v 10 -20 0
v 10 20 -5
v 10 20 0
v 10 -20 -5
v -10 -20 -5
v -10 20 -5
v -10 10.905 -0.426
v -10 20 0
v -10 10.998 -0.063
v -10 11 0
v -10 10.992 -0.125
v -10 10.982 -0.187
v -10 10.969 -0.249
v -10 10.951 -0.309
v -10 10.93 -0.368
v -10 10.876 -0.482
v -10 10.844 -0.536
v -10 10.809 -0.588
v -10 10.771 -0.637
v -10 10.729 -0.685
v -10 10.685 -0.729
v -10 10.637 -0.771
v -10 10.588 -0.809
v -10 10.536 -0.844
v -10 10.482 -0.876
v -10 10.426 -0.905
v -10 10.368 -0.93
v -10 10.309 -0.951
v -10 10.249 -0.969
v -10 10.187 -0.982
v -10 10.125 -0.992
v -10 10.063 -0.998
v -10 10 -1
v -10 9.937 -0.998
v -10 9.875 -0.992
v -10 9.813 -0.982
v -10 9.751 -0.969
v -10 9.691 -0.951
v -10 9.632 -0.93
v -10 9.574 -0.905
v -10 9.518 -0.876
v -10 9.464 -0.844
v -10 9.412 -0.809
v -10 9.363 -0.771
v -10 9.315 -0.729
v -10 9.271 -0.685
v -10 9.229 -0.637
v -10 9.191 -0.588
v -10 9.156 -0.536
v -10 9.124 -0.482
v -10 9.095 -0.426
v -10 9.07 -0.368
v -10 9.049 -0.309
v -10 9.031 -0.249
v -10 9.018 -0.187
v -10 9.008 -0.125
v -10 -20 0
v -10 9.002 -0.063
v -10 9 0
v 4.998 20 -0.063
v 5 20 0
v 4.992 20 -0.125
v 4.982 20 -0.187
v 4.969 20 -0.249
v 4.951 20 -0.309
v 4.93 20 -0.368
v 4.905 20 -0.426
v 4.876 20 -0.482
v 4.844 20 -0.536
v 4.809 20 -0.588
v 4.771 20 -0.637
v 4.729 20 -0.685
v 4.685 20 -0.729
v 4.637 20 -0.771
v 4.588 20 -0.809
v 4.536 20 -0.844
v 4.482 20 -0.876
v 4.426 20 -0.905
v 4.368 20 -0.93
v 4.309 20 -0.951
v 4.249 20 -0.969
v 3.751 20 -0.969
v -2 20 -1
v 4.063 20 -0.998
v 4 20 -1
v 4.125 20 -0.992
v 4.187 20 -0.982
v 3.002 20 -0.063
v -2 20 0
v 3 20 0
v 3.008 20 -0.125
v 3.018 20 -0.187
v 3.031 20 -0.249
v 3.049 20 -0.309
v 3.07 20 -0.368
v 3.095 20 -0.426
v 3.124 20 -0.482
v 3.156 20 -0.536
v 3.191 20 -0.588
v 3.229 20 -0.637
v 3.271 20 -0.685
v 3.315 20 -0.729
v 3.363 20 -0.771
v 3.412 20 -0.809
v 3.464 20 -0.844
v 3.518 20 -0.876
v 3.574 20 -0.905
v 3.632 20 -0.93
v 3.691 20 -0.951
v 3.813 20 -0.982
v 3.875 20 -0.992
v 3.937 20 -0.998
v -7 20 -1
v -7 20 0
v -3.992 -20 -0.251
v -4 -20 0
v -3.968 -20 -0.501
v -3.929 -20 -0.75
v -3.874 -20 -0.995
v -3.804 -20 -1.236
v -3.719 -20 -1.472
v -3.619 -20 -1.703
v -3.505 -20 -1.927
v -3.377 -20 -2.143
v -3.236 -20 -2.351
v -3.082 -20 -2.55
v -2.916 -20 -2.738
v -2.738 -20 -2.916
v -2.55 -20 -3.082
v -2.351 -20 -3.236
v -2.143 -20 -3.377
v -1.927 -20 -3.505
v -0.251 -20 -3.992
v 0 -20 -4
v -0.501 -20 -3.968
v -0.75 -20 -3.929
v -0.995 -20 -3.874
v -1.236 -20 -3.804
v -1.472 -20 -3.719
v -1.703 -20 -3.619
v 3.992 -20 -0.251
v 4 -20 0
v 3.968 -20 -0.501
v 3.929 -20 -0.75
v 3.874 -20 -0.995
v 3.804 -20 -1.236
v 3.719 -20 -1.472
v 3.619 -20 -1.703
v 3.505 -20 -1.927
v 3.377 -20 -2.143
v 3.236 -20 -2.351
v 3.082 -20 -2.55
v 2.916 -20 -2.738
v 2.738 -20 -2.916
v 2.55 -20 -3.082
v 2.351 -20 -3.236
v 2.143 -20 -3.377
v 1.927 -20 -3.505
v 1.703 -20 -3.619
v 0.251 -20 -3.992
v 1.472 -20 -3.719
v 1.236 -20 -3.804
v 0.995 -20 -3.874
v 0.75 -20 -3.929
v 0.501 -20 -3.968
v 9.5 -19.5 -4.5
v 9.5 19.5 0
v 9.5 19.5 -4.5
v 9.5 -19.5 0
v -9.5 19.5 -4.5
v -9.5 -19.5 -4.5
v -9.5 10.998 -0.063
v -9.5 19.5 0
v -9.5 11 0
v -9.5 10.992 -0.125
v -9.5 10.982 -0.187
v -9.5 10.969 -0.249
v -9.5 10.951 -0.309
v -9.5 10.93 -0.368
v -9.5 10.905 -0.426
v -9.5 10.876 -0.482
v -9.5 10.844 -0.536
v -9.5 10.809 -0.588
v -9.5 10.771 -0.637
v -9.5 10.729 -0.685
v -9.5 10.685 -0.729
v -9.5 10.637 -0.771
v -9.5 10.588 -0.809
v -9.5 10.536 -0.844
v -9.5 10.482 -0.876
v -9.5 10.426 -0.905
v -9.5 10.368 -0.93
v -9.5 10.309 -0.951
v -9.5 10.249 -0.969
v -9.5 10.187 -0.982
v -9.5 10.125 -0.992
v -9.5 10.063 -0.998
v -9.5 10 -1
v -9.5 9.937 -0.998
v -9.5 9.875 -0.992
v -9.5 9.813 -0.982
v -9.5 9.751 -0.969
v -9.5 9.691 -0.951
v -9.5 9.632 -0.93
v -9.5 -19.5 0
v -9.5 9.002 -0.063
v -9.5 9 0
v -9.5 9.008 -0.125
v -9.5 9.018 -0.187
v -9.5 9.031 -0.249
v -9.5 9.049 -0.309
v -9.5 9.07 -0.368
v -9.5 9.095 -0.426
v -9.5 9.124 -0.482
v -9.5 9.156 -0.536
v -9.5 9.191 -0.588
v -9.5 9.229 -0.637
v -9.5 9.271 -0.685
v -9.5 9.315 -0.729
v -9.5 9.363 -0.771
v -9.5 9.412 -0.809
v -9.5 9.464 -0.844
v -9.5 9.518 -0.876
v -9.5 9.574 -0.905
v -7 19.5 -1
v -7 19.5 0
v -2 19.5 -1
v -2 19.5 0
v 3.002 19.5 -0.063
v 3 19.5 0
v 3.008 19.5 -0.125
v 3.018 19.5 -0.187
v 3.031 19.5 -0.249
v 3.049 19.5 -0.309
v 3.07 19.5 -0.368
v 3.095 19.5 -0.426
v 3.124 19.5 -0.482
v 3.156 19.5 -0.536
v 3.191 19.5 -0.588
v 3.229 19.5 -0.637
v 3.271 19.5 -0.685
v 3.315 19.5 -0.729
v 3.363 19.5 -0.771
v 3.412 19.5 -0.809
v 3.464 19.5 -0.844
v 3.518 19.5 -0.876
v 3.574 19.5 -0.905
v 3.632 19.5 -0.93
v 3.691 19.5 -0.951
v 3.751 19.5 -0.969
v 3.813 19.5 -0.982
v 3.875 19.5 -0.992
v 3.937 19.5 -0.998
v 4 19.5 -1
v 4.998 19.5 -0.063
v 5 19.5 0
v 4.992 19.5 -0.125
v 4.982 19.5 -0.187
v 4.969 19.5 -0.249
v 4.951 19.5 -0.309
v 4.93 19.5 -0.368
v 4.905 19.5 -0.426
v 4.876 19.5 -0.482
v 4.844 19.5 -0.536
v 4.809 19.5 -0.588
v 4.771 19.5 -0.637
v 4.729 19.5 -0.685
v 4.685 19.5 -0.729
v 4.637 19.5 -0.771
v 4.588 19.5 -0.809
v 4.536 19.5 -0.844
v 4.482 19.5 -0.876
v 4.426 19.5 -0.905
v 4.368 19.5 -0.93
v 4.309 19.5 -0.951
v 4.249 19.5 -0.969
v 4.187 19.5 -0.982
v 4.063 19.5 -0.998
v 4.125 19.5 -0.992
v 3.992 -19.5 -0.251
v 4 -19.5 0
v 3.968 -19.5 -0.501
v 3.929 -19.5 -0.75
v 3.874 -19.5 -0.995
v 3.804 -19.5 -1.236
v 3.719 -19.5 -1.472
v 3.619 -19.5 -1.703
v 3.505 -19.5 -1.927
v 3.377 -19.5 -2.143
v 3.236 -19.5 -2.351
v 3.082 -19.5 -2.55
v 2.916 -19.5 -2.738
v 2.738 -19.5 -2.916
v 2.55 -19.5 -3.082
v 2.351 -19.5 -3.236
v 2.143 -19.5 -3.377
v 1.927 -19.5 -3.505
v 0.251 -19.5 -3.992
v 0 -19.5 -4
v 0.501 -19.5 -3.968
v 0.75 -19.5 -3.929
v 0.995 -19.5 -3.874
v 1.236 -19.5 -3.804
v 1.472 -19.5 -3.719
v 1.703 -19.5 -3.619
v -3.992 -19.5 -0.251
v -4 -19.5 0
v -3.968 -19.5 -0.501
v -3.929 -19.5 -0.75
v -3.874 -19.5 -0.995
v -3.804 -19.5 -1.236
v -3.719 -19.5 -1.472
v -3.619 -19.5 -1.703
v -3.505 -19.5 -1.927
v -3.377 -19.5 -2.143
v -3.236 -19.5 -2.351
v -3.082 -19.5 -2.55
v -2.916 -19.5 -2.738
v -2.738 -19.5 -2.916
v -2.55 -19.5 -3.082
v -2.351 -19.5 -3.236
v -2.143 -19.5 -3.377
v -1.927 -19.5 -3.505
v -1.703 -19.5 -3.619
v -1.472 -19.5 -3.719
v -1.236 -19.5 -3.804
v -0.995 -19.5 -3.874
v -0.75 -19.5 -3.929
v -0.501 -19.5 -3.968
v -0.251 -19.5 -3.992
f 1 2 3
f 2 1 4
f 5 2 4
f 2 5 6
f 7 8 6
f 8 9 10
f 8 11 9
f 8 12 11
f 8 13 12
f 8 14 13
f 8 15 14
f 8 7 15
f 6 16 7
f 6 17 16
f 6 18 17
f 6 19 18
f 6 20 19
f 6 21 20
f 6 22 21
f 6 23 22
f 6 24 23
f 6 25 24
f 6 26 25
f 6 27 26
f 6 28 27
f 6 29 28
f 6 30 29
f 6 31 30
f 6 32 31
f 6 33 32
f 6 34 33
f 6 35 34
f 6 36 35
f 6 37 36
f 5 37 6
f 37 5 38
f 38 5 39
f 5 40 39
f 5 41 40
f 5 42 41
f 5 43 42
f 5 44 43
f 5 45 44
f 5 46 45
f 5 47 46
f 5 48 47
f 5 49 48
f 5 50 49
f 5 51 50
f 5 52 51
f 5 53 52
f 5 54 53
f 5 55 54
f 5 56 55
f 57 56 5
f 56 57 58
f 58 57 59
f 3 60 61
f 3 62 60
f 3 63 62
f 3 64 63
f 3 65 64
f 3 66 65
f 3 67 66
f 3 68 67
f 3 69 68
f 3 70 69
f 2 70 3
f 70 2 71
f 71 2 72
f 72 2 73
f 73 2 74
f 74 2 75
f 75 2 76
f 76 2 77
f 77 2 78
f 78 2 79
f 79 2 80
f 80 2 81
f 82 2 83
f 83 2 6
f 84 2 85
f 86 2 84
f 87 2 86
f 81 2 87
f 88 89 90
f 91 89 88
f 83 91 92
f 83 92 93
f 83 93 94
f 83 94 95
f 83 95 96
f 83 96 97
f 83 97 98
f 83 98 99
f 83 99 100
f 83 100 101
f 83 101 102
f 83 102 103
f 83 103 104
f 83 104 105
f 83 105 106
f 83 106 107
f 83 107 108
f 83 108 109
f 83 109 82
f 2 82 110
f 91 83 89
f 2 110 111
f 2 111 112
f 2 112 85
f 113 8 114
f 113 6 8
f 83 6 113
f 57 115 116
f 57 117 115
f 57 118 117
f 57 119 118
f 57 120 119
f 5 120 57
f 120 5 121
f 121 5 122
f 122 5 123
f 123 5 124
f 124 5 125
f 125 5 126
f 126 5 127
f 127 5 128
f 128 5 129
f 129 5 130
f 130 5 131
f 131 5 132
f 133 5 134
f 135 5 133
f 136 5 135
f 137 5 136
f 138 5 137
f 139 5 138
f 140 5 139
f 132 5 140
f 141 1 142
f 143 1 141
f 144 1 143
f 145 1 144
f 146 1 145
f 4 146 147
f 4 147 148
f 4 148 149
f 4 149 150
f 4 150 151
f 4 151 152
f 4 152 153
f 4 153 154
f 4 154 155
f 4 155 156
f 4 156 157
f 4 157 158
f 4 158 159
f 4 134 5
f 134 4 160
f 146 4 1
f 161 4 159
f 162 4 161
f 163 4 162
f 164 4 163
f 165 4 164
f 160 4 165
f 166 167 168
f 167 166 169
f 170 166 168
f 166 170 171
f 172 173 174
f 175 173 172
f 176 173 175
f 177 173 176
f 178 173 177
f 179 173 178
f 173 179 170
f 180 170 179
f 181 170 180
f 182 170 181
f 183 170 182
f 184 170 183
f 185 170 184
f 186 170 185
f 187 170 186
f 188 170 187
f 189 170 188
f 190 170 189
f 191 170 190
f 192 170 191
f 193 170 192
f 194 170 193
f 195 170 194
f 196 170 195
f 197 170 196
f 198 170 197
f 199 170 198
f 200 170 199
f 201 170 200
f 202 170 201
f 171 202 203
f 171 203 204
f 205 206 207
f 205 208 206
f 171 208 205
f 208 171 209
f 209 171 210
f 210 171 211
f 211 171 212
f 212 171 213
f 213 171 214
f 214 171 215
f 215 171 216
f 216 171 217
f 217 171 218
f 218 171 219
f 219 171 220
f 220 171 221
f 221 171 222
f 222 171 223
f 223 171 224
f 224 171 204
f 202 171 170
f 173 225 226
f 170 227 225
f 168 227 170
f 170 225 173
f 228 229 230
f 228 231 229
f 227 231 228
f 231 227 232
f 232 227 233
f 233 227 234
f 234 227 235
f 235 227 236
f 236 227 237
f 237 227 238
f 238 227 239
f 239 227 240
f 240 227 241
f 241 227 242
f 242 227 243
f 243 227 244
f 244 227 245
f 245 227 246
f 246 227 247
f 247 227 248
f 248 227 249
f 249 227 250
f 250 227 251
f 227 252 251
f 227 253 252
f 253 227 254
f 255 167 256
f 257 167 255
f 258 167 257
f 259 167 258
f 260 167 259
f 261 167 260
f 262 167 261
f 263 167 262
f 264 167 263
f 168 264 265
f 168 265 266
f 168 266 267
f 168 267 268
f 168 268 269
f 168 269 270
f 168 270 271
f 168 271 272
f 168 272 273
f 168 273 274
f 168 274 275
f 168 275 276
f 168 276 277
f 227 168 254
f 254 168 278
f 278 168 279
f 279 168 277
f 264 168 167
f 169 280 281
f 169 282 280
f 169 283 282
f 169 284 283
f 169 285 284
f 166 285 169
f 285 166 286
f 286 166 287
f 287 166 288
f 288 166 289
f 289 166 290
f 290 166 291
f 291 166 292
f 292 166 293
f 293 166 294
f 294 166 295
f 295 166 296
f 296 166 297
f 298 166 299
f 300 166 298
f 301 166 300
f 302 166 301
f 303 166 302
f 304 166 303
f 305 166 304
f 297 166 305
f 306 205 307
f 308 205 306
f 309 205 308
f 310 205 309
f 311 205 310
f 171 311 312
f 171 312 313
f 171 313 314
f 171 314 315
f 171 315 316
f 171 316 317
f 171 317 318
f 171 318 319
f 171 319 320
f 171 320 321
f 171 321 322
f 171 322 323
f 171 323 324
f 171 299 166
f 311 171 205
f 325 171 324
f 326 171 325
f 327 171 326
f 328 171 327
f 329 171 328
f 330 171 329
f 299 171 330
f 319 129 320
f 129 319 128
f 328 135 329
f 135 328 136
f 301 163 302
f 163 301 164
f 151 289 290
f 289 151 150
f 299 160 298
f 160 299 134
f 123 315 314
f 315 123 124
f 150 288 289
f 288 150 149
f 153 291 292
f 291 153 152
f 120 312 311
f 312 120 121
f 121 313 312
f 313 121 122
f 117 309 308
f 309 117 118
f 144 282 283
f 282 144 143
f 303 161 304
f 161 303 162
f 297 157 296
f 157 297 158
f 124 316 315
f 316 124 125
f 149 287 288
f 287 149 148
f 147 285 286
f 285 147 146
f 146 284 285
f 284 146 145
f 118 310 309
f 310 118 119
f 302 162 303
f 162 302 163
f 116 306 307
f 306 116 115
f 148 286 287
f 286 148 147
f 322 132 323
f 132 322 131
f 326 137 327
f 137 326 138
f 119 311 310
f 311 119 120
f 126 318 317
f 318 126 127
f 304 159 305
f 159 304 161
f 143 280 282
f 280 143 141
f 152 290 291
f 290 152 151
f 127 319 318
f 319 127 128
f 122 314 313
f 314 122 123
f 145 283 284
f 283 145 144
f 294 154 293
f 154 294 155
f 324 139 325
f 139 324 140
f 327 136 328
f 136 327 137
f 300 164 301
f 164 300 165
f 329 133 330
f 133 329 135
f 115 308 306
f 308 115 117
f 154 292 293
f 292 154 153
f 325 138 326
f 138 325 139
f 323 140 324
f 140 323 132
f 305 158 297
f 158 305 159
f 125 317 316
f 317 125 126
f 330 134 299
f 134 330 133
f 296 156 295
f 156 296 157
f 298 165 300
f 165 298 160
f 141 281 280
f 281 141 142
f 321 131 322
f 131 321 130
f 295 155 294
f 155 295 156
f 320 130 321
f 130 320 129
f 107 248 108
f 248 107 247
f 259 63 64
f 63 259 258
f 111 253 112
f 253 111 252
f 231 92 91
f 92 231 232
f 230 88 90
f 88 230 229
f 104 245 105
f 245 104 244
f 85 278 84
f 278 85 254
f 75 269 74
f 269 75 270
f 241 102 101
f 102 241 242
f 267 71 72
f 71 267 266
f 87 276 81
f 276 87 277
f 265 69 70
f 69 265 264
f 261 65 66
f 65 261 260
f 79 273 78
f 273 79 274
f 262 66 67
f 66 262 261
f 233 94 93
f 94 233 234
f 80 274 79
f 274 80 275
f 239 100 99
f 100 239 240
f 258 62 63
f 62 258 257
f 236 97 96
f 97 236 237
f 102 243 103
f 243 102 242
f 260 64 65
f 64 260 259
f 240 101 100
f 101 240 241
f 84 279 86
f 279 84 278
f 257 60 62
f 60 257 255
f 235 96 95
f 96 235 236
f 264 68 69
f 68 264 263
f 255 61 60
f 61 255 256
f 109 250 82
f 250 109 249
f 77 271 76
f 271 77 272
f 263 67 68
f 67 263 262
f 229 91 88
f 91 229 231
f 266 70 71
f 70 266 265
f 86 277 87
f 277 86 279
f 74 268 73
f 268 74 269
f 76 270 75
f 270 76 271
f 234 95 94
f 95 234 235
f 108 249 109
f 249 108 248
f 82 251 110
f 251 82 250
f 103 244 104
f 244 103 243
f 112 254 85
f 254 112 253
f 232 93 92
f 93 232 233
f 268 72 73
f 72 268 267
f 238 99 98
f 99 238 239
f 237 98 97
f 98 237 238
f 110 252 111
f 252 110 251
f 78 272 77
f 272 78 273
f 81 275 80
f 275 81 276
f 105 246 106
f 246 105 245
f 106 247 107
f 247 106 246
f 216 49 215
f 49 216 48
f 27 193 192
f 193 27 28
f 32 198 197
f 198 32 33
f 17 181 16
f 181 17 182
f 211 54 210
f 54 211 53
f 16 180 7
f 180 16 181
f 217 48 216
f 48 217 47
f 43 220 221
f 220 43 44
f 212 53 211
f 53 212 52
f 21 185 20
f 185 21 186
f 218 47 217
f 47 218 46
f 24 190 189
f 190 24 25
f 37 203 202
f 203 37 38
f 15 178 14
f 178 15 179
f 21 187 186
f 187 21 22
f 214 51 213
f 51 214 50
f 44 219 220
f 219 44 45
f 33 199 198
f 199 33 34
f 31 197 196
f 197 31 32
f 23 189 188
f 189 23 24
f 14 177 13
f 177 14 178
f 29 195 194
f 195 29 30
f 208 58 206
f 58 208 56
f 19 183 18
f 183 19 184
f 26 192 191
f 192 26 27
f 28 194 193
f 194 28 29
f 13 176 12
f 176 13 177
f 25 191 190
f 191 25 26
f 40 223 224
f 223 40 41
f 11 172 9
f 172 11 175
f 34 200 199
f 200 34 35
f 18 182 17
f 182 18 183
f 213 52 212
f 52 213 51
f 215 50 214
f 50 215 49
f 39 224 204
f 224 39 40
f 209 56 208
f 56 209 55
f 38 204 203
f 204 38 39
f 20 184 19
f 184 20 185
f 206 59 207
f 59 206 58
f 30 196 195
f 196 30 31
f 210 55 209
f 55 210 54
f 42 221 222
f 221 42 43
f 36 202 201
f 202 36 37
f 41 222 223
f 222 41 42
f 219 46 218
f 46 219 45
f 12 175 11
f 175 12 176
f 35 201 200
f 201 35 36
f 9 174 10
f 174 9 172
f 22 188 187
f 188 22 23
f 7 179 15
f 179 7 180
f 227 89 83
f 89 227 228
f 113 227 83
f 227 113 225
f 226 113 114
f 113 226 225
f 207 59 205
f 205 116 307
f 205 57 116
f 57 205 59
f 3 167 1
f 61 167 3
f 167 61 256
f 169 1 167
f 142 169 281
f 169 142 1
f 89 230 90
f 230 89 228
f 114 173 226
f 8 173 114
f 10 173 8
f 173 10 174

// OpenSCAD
// Bottom
difference() {
difference() {
    cube(size = [20,40,10], center = true);
    cube(size = [19,39,9], center = true);
    translate([0,-17,0]) { rotate ([90,0,0]) cylinder(h = 10, r = 4, $fn=100); } //distance sensor
    translate([4,21,0]) { rotate ([90,0,0]) cylinder(h = 4, r = 1, $fn=100); } //charging
    translate([-11,10,0]) { rotate ([0,90,0]) cylinder(h = 3, r = 1, $fn=100); } //vibrator
    translate([-7,17,-1]) {cube(size = [5,4,2]); }
}
  translate([-12,-21,0]) { cube(size = [25,45,6]); }
}

/* Top
difference() {
difference() {
    cube(size = [20,40,10], center = true);
    cube(size = [19,39,9], center = true);
    translate([0,-17,0]) { rotate ([90,0,0]) cylinder(h = 10, r = 4, $fn=100); } //distance sensor
    translate([4,21,0]) { rotate ([90,0,0]) cylinder(h = 4, r = 1, $fn=100); } //charging
    translate([-11,10,0]) { rotate ([0,90,0]) cylinder(h = 3, r = 1, $fn=100); } //vibrator
    translate([-7,17,-1]) {cube(size = [5,4,2]); }
}
  translate([-12,-21,0]) { cube(size = [25,45,6]); }
}
*/
